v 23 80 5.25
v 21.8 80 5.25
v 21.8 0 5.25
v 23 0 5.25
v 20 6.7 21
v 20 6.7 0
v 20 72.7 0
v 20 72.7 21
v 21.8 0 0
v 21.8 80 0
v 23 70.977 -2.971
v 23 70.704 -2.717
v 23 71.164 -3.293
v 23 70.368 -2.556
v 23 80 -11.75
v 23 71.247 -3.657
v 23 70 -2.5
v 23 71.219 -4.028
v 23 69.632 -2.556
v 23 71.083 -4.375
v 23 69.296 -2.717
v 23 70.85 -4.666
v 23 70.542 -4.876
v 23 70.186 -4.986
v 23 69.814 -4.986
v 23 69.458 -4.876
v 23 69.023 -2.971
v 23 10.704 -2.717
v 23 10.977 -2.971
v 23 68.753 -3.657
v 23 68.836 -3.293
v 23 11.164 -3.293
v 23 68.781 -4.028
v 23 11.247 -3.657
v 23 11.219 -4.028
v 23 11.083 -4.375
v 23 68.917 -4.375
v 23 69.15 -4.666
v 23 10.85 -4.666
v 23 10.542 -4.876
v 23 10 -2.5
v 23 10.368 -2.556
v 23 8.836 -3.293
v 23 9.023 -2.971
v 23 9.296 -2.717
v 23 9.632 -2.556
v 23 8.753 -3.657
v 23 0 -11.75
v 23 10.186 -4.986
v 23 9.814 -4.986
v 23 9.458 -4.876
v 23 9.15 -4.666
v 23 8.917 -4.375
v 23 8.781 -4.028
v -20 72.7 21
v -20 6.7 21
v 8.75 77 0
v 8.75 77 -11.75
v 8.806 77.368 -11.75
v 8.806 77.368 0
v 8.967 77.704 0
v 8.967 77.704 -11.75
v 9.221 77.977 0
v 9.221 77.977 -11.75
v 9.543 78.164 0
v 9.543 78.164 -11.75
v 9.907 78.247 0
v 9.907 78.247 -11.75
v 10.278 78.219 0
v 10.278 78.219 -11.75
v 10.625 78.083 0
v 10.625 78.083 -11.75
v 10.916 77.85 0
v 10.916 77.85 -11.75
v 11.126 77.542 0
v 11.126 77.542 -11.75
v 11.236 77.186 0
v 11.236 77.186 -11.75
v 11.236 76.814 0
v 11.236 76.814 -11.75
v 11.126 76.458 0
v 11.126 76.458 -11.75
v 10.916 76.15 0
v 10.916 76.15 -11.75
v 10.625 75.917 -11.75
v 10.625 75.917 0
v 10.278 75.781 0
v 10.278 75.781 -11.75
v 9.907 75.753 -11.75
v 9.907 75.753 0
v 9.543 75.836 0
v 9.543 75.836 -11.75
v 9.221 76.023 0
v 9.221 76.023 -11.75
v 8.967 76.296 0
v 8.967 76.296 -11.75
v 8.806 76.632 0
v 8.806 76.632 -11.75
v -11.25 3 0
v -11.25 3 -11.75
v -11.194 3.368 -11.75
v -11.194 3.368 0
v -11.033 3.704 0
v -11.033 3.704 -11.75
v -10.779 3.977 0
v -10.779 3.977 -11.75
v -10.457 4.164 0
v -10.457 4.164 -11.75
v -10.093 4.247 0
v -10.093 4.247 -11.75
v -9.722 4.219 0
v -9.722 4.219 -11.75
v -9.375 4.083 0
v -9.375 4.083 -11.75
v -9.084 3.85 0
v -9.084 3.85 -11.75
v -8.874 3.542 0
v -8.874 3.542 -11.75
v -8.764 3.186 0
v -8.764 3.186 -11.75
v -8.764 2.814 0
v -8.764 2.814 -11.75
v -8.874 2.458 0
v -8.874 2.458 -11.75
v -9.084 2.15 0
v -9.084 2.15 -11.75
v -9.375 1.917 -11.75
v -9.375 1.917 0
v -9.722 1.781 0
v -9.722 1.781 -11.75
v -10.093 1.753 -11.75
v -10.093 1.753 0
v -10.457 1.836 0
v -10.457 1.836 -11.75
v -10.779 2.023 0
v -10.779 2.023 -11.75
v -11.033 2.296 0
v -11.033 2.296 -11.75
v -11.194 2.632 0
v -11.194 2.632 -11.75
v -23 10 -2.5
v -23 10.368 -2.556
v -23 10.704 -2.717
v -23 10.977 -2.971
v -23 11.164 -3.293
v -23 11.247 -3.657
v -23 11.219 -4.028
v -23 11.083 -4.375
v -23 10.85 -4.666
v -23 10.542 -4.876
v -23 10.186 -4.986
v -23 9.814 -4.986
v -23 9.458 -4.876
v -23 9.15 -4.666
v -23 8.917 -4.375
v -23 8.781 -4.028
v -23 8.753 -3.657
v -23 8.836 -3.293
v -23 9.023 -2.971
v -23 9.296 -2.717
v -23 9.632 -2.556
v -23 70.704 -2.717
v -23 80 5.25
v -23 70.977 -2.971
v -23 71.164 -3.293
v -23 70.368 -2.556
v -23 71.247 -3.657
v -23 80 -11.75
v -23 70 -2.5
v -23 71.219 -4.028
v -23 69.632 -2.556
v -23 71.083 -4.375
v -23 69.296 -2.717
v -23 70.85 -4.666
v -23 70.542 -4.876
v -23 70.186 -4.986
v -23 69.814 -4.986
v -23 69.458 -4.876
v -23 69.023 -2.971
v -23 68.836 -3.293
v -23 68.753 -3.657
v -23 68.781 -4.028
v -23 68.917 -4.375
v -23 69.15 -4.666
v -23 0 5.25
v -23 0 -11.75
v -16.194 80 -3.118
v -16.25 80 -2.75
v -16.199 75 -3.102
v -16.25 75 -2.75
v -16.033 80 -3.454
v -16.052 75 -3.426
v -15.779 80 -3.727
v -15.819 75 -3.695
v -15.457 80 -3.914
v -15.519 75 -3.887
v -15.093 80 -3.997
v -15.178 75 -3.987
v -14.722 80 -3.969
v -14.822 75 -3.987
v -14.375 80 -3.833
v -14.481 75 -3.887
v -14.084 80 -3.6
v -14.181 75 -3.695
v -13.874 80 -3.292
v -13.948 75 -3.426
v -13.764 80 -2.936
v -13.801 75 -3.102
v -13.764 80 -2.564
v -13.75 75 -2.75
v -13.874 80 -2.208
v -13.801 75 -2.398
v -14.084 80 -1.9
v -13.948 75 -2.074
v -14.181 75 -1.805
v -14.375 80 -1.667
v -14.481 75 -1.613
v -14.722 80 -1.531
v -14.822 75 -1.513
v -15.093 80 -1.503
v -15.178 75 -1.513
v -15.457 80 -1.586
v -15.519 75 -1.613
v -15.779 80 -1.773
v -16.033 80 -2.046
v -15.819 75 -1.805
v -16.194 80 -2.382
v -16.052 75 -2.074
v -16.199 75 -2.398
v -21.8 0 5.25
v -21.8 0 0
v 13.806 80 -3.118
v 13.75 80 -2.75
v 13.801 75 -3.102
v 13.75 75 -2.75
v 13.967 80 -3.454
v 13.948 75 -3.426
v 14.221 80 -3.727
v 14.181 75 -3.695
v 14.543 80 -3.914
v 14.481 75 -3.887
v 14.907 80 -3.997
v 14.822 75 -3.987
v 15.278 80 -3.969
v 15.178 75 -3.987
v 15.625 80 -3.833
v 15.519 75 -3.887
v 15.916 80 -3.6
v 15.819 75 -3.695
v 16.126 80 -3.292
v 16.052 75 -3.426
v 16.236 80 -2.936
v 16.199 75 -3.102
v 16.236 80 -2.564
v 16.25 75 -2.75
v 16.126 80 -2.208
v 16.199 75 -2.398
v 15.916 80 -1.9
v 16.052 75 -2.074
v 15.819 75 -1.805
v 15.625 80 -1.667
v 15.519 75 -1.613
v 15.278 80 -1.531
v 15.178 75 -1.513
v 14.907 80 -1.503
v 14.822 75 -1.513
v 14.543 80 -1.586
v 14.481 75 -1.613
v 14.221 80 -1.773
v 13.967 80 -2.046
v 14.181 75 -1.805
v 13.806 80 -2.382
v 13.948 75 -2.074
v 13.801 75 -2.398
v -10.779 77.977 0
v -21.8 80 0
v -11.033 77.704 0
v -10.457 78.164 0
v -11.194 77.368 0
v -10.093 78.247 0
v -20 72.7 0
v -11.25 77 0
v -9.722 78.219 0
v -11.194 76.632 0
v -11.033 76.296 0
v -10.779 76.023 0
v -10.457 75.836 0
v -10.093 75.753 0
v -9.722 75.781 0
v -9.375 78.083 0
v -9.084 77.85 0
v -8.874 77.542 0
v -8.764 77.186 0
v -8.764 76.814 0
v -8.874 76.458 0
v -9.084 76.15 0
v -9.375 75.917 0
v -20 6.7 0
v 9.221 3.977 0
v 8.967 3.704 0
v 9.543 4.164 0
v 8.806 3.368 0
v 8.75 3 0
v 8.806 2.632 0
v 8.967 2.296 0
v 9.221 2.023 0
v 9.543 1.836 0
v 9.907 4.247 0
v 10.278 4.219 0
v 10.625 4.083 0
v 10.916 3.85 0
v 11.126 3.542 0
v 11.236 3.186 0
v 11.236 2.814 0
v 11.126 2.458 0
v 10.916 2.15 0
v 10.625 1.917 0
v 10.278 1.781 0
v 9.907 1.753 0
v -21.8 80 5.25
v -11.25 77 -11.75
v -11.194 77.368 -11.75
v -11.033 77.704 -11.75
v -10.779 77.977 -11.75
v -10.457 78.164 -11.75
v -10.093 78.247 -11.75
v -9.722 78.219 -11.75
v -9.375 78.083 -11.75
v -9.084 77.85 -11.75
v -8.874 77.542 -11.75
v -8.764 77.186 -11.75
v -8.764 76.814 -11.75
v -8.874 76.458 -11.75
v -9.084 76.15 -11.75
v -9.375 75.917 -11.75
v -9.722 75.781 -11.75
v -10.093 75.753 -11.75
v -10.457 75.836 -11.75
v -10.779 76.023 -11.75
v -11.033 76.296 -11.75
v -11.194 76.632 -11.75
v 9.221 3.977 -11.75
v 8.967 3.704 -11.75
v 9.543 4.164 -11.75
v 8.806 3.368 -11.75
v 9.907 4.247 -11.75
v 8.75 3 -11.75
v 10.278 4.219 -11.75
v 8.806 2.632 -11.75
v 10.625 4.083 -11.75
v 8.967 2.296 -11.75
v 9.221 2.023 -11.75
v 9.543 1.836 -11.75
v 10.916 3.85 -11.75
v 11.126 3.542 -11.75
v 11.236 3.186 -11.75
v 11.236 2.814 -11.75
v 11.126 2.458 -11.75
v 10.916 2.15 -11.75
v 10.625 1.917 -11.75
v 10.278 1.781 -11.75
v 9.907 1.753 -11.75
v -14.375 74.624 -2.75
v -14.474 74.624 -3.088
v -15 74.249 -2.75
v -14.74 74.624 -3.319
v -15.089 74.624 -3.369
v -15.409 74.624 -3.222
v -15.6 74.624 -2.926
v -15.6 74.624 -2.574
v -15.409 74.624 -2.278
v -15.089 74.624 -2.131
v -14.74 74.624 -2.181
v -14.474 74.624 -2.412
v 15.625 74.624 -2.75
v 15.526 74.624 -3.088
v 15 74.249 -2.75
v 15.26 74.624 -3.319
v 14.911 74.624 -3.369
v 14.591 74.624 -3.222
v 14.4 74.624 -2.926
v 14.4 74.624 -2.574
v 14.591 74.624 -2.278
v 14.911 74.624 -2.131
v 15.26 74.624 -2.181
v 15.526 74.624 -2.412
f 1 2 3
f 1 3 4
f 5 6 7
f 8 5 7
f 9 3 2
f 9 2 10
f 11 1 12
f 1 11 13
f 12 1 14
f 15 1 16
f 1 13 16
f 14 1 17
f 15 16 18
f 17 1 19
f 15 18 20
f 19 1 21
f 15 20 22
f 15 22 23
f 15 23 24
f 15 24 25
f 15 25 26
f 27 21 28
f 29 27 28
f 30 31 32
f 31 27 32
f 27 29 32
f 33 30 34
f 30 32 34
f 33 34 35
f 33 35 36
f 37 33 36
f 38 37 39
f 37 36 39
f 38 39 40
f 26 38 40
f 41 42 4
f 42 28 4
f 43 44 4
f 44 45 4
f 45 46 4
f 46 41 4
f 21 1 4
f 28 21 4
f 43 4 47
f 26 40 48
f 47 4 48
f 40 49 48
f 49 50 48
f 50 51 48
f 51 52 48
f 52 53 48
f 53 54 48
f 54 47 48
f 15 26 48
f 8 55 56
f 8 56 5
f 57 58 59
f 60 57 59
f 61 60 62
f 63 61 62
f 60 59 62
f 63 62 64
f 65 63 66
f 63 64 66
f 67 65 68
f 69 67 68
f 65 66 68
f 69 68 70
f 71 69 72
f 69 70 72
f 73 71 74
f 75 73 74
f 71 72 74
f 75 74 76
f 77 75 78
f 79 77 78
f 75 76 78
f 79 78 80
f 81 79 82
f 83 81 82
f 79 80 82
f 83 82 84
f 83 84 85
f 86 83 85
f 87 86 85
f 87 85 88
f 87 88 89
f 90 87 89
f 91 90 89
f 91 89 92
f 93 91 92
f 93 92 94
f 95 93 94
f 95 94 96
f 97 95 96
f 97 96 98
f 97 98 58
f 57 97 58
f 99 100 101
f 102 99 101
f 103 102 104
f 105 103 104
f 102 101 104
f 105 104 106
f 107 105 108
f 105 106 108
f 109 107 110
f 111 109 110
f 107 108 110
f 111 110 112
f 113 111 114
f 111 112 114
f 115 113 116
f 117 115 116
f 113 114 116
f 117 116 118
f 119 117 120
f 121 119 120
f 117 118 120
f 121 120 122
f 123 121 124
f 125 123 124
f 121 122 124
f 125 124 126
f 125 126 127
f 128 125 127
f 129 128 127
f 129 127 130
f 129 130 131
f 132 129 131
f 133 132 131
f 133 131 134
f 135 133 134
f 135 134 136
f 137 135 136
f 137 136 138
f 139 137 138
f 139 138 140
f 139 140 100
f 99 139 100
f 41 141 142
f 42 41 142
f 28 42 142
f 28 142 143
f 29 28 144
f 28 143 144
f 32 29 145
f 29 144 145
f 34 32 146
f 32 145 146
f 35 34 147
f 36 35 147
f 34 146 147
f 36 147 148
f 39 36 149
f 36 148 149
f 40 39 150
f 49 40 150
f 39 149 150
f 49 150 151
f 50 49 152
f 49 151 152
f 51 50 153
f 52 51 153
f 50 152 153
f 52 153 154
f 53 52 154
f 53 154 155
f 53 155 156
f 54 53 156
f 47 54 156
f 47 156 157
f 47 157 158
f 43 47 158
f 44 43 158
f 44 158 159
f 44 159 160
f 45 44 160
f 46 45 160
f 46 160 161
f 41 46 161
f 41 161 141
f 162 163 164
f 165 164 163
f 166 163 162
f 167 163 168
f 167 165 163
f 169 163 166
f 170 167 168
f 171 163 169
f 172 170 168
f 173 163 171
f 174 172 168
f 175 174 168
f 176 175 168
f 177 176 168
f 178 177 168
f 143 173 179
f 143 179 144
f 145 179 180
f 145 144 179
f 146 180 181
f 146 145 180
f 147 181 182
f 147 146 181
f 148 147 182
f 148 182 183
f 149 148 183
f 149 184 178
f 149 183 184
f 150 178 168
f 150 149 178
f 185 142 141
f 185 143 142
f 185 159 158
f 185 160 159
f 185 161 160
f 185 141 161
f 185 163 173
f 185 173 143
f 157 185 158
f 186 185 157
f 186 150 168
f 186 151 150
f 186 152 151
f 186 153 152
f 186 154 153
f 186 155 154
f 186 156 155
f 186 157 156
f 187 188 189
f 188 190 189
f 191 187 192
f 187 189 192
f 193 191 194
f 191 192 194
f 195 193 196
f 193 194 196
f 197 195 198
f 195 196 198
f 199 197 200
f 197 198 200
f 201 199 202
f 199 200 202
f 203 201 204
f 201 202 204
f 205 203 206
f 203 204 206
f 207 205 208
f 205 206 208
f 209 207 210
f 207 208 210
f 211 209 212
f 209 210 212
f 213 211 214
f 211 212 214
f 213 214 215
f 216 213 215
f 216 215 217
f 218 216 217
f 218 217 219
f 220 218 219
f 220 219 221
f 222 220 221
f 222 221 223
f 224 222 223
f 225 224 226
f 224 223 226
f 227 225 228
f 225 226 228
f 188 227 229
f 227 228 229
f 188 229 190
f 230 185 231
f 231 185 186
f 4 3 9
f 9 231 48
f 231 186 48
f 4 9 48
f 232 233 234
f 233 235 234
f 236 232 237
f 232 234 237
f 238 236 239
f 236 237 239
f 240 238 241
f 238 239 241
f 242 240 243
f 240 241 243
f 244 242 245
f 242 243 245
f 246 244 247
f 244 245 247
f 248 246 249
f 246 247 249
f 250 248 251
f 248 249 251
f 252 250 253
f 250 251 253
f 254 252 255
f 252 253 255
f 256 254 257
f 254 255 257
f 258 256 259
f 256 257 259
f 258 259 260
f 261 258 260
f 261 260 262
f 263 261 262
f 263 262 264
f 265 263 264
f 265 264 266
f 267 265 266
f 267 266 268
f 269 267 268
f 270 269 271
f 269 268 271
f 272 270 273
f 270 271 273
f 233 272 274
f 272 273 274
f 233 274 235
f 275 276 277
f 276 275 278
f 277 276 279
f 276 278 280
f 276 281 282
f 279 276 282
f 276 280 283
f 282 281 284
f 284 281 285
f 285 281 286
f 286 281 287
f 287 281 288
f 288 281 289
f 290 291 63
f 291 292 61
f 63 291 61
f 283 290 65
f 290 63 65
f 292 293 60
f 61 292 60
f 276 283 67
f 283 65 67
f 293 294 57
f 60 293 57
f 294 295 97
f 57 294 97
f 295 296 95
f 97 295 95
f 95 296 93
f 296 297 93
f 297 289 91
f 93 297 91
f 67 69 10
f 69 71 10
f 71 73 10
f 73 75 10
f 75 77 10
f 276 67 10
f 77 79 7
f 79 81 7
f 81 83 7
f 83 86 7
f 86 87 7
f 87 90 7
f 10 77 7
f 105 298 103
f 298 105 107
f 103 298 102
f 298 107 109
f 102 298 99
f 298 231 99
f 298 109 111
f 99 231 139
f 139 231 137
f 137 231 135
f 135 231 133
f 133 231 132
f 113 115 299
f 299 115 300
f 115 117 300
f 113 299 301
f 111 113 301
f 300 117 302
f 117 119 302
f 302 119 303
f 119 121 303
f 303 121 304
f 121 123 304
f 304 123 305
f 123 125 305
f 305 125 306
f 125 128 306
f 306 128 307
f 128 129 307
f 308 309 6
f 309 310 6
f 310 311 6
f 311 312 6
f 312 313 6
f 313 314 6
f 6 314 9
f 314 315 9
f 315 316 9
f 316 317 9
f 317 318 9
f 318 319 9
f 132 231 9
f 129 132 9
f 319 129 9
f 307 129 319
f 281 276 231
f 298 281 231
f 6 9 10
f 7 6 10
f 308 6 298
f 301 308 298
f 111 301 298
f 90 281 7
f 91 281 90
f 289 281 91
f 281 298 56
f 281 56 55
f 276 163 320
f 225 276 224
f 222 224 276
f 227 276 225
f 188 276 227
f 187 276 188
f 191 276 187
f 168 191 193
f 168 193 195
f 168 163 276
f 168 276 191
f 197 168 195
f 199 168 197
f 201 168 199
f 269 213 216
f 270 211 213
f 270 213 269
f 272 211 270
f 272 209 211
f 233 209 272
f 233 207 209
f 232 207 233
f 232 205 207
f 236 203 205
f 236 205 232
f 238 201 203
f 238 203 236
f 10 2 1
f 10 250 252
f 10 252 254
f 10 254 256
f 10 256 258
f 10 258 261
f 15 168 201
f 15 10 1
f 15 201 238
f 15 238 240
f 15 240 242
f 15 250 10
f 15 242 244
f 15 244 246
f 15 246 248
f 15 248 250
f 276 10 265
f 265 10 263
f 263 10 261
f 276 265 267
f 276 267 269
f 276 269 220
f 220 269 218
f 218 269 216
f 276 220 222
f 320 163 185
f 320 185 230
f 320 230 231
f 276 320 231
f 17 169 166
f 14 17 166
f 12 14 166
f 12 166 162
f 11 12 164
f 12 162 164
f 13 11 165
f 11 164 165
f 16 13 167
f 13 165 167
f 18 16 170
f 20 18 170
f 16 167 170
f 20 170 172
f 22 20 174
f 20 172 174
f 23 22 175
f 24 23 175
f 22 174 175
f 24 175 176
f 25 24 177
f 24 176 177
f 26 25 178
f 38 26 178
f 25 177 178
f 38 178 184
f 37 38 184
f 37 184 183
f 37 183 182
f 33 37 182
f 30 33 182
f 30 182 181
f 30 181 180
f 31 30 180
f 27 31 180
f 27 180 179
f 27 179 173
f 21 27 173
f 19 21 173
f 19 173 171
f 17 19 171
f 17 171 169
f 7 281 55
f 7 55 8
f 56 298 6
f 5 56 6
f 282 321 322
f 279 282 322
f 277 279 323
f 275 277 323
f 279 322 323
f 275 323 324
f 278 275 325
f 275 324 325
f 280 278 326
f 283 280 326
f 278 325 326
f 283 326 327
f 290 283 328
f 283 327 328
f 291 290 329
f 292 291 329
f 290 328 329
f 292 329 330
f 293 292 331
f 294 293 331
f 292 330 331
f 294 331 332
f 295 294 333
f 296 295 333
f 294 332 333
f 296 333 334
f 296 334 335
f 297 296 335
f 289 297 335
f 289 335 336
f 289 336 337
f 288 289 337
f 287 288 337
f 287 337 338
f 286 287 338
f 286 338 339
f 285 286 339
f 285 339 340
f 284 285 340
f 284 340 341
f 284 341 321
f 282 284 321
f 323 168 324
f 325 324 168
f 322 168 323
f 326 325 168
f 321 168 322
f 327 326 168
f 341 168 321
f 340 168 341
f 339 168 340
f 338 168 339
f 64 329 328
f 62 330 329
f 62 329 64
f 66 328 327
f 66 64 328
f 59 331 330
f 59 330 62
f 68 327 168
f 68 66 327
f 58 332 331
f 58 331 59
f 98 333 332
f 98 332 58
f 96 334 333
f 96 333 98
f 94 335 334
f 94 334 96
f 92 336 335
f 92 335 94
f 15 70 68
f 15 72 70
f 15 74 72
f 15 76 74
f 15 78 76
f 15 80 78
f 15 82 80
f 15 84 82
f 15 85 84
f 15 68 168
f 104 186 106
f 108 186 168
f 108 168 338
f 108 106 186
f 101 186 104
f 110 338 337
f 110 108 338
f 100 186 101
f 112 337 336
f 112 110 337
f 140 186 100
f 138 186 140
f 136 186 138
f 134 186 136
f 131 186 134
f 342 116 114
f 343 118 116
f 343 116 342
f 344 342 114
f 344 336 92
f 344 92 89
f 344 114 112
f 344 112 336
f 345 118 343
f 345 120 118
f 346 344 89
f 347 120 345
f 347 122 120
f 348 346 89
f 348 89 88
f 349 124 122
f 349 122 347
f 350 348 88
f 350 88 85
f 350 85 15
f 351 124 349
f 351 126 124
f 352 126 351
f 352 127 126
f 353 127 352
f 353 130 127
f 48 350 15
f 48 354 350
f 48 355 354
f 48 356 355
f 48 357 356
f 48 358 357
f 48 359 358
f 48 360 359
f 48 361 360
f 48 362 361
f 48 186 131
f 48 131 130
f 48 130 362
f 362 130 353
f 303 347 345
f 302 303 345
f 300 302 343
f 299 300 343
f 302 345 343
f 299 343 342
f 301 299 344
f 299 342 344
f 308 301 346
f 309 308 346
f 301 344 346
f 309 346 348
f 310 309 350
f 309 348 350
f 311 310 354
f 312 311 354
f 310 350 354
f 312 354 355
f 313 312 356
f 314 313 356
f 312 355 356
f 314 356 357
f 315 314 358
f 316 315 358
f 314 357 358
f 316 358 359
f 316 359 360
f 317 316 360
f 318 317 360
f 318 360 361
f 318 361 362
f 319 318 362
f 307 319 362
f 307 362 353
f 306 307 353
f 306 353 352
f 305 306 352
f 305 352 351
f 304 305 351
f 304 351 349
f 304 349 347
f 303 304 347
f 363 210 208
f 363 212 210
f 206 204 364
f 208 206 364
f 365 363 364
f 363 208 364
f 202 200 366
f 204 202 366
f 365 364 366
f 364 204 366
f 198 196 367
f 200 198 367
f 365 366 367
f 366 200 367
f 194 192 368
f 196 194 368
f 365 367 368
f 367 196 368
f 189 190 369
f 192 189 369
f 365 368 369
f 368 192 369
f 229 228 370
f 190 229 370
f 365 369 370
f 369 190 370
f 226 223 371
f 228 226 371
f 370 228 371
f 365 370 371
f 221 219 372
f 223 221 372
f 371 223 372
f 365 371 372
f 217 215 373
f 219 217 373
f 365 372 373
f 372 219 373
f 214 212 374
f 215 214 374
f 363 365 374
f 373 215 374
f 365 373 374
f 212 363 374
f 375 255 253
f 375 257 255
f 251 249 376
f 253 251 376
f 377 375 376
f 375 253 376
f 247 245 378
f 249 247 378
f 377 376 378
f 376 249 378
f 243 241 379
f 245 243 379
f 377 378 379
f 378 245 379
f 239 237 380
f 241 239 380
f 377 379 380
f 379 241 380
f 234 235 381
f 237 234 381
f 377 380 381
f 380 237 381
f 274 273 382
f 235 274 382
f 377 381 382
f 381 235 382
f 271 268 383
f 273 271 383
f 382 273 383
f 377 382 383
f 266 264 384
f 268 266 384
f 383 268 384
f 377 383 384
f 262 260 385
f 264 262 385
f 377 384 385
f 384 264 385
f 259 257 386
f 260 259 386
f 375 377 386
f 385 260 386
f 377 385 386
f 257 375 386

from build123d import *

# Parameters (mm, degrees)
SKETCH1_W                     = 46
SKETCH1_H                     = 11.75
BOSS_EXTRUDE1_DEPTH           = 80
SKETCH2_W                     = 1.2
SKETCH2_H                     = 5.25
BOSS_EXTRUDE2_DEPTH           = 80
SKETCH3_W                     = 40
SKETCH3_H                     = 66
CIRCUIT_BOARD_CLEARANCE_DEPTH = 21
M3X0_5_TAPPED_HOLE1_D         = 2.5
M3X0_5_TAPPED_HOLE2_D         = 2.5
M3X0_5_TAPPED_HOLE2_DEPTH     = 5
M3X0_5_TAPPED_HOLE2_TIP       = 0.751075774
M3X0_5_TAPPED_HOLE3_D         = 2.5


with BuildPart() as part:
    # Sketch1 → Boss-Extrude1 (new body)
    with BuildSketch(Plane(origin=(0, 0, 0), x_dir=(1, 0, 0), z_dir=(0, 1, 0))):
        with Locations((0, 5.875)):
            Rectangle(SKETCH1_W, SKETCH1_H)
    extrude(amount=BOSS_EXTRUDE1_DEPTH)

    # Sketch2 → Boss-Extrude2 (add)
    with BuildSketch(Plane(origin=(0, 0, 0), x_dir=(1, 0, 0), z_dir=(0, 1, 0))):
        with Locations((-22.4, -2.625)):
            Rectangle(SKETCH2_W, SKETCH2_H)
        with Locations((22.4, -2.625)):
            Rectangle(SKETCH2_W, SKETCH2_H)
    extrude(amount=BOSS_EXTRUDE2_DEPTH)

    # Sketch3 → Circuit Board clearance (add)
    with BuildSketch(Plane.XY):
        with Locations((0, 39.7)):
            Rectangle(SKETCH3_W, SKETCH3_H)
    extrude(amount=CIRCUIT_BOARD_CLEARANCE_DEPTH)

    # M3x0.5 Tapped Hole1 (through all)
    with Locations(Plane.XY):
        with Locations((-10, 77), (10, 77), (-10, 3), (10, 3)):
            Hole(M3X0_5_TAPPED_HOLE1_D / 2)

    # M3x0.5 Tapped Hole2
    with Locations(Plane(origin=(0, 80, 0), x_dir=(1, 0, 0), z_dir=(0, 1, 0))):
        with Locations((-15, 2.75), (15, 2.75)):
            Hole(M3X0_5_TAPPED_HOLE2_D / 2, depth=M3X0_5_TAPPED_HOLE2_DEPTH)
            with Locations((0, 0, -(M3X0_5_TAPPED_HOLE2_DEPTH + M3X0_5_TAPPED_HOLE2_TIP / 2))):  # 118° drill point
                Cone(0, M3X0_5_TAPPED_HOLE2_D / 2, M3X0_5_TAPPED_HOLE2_TIP, mode=Mode.SUBTRACT)

    # M3x0.5 Tapped Hole3 (through all)
    with Locations(Plane(origin=(23, 0, 0), x_dir=(0, 0, -1), z_dir=(1, 0, 0))):
        with Locations((3.75, 70), (3.75, 10)):
            Hole(M3X0_5_TAPPED_HOLE3_D / 2)


solid = part.part
